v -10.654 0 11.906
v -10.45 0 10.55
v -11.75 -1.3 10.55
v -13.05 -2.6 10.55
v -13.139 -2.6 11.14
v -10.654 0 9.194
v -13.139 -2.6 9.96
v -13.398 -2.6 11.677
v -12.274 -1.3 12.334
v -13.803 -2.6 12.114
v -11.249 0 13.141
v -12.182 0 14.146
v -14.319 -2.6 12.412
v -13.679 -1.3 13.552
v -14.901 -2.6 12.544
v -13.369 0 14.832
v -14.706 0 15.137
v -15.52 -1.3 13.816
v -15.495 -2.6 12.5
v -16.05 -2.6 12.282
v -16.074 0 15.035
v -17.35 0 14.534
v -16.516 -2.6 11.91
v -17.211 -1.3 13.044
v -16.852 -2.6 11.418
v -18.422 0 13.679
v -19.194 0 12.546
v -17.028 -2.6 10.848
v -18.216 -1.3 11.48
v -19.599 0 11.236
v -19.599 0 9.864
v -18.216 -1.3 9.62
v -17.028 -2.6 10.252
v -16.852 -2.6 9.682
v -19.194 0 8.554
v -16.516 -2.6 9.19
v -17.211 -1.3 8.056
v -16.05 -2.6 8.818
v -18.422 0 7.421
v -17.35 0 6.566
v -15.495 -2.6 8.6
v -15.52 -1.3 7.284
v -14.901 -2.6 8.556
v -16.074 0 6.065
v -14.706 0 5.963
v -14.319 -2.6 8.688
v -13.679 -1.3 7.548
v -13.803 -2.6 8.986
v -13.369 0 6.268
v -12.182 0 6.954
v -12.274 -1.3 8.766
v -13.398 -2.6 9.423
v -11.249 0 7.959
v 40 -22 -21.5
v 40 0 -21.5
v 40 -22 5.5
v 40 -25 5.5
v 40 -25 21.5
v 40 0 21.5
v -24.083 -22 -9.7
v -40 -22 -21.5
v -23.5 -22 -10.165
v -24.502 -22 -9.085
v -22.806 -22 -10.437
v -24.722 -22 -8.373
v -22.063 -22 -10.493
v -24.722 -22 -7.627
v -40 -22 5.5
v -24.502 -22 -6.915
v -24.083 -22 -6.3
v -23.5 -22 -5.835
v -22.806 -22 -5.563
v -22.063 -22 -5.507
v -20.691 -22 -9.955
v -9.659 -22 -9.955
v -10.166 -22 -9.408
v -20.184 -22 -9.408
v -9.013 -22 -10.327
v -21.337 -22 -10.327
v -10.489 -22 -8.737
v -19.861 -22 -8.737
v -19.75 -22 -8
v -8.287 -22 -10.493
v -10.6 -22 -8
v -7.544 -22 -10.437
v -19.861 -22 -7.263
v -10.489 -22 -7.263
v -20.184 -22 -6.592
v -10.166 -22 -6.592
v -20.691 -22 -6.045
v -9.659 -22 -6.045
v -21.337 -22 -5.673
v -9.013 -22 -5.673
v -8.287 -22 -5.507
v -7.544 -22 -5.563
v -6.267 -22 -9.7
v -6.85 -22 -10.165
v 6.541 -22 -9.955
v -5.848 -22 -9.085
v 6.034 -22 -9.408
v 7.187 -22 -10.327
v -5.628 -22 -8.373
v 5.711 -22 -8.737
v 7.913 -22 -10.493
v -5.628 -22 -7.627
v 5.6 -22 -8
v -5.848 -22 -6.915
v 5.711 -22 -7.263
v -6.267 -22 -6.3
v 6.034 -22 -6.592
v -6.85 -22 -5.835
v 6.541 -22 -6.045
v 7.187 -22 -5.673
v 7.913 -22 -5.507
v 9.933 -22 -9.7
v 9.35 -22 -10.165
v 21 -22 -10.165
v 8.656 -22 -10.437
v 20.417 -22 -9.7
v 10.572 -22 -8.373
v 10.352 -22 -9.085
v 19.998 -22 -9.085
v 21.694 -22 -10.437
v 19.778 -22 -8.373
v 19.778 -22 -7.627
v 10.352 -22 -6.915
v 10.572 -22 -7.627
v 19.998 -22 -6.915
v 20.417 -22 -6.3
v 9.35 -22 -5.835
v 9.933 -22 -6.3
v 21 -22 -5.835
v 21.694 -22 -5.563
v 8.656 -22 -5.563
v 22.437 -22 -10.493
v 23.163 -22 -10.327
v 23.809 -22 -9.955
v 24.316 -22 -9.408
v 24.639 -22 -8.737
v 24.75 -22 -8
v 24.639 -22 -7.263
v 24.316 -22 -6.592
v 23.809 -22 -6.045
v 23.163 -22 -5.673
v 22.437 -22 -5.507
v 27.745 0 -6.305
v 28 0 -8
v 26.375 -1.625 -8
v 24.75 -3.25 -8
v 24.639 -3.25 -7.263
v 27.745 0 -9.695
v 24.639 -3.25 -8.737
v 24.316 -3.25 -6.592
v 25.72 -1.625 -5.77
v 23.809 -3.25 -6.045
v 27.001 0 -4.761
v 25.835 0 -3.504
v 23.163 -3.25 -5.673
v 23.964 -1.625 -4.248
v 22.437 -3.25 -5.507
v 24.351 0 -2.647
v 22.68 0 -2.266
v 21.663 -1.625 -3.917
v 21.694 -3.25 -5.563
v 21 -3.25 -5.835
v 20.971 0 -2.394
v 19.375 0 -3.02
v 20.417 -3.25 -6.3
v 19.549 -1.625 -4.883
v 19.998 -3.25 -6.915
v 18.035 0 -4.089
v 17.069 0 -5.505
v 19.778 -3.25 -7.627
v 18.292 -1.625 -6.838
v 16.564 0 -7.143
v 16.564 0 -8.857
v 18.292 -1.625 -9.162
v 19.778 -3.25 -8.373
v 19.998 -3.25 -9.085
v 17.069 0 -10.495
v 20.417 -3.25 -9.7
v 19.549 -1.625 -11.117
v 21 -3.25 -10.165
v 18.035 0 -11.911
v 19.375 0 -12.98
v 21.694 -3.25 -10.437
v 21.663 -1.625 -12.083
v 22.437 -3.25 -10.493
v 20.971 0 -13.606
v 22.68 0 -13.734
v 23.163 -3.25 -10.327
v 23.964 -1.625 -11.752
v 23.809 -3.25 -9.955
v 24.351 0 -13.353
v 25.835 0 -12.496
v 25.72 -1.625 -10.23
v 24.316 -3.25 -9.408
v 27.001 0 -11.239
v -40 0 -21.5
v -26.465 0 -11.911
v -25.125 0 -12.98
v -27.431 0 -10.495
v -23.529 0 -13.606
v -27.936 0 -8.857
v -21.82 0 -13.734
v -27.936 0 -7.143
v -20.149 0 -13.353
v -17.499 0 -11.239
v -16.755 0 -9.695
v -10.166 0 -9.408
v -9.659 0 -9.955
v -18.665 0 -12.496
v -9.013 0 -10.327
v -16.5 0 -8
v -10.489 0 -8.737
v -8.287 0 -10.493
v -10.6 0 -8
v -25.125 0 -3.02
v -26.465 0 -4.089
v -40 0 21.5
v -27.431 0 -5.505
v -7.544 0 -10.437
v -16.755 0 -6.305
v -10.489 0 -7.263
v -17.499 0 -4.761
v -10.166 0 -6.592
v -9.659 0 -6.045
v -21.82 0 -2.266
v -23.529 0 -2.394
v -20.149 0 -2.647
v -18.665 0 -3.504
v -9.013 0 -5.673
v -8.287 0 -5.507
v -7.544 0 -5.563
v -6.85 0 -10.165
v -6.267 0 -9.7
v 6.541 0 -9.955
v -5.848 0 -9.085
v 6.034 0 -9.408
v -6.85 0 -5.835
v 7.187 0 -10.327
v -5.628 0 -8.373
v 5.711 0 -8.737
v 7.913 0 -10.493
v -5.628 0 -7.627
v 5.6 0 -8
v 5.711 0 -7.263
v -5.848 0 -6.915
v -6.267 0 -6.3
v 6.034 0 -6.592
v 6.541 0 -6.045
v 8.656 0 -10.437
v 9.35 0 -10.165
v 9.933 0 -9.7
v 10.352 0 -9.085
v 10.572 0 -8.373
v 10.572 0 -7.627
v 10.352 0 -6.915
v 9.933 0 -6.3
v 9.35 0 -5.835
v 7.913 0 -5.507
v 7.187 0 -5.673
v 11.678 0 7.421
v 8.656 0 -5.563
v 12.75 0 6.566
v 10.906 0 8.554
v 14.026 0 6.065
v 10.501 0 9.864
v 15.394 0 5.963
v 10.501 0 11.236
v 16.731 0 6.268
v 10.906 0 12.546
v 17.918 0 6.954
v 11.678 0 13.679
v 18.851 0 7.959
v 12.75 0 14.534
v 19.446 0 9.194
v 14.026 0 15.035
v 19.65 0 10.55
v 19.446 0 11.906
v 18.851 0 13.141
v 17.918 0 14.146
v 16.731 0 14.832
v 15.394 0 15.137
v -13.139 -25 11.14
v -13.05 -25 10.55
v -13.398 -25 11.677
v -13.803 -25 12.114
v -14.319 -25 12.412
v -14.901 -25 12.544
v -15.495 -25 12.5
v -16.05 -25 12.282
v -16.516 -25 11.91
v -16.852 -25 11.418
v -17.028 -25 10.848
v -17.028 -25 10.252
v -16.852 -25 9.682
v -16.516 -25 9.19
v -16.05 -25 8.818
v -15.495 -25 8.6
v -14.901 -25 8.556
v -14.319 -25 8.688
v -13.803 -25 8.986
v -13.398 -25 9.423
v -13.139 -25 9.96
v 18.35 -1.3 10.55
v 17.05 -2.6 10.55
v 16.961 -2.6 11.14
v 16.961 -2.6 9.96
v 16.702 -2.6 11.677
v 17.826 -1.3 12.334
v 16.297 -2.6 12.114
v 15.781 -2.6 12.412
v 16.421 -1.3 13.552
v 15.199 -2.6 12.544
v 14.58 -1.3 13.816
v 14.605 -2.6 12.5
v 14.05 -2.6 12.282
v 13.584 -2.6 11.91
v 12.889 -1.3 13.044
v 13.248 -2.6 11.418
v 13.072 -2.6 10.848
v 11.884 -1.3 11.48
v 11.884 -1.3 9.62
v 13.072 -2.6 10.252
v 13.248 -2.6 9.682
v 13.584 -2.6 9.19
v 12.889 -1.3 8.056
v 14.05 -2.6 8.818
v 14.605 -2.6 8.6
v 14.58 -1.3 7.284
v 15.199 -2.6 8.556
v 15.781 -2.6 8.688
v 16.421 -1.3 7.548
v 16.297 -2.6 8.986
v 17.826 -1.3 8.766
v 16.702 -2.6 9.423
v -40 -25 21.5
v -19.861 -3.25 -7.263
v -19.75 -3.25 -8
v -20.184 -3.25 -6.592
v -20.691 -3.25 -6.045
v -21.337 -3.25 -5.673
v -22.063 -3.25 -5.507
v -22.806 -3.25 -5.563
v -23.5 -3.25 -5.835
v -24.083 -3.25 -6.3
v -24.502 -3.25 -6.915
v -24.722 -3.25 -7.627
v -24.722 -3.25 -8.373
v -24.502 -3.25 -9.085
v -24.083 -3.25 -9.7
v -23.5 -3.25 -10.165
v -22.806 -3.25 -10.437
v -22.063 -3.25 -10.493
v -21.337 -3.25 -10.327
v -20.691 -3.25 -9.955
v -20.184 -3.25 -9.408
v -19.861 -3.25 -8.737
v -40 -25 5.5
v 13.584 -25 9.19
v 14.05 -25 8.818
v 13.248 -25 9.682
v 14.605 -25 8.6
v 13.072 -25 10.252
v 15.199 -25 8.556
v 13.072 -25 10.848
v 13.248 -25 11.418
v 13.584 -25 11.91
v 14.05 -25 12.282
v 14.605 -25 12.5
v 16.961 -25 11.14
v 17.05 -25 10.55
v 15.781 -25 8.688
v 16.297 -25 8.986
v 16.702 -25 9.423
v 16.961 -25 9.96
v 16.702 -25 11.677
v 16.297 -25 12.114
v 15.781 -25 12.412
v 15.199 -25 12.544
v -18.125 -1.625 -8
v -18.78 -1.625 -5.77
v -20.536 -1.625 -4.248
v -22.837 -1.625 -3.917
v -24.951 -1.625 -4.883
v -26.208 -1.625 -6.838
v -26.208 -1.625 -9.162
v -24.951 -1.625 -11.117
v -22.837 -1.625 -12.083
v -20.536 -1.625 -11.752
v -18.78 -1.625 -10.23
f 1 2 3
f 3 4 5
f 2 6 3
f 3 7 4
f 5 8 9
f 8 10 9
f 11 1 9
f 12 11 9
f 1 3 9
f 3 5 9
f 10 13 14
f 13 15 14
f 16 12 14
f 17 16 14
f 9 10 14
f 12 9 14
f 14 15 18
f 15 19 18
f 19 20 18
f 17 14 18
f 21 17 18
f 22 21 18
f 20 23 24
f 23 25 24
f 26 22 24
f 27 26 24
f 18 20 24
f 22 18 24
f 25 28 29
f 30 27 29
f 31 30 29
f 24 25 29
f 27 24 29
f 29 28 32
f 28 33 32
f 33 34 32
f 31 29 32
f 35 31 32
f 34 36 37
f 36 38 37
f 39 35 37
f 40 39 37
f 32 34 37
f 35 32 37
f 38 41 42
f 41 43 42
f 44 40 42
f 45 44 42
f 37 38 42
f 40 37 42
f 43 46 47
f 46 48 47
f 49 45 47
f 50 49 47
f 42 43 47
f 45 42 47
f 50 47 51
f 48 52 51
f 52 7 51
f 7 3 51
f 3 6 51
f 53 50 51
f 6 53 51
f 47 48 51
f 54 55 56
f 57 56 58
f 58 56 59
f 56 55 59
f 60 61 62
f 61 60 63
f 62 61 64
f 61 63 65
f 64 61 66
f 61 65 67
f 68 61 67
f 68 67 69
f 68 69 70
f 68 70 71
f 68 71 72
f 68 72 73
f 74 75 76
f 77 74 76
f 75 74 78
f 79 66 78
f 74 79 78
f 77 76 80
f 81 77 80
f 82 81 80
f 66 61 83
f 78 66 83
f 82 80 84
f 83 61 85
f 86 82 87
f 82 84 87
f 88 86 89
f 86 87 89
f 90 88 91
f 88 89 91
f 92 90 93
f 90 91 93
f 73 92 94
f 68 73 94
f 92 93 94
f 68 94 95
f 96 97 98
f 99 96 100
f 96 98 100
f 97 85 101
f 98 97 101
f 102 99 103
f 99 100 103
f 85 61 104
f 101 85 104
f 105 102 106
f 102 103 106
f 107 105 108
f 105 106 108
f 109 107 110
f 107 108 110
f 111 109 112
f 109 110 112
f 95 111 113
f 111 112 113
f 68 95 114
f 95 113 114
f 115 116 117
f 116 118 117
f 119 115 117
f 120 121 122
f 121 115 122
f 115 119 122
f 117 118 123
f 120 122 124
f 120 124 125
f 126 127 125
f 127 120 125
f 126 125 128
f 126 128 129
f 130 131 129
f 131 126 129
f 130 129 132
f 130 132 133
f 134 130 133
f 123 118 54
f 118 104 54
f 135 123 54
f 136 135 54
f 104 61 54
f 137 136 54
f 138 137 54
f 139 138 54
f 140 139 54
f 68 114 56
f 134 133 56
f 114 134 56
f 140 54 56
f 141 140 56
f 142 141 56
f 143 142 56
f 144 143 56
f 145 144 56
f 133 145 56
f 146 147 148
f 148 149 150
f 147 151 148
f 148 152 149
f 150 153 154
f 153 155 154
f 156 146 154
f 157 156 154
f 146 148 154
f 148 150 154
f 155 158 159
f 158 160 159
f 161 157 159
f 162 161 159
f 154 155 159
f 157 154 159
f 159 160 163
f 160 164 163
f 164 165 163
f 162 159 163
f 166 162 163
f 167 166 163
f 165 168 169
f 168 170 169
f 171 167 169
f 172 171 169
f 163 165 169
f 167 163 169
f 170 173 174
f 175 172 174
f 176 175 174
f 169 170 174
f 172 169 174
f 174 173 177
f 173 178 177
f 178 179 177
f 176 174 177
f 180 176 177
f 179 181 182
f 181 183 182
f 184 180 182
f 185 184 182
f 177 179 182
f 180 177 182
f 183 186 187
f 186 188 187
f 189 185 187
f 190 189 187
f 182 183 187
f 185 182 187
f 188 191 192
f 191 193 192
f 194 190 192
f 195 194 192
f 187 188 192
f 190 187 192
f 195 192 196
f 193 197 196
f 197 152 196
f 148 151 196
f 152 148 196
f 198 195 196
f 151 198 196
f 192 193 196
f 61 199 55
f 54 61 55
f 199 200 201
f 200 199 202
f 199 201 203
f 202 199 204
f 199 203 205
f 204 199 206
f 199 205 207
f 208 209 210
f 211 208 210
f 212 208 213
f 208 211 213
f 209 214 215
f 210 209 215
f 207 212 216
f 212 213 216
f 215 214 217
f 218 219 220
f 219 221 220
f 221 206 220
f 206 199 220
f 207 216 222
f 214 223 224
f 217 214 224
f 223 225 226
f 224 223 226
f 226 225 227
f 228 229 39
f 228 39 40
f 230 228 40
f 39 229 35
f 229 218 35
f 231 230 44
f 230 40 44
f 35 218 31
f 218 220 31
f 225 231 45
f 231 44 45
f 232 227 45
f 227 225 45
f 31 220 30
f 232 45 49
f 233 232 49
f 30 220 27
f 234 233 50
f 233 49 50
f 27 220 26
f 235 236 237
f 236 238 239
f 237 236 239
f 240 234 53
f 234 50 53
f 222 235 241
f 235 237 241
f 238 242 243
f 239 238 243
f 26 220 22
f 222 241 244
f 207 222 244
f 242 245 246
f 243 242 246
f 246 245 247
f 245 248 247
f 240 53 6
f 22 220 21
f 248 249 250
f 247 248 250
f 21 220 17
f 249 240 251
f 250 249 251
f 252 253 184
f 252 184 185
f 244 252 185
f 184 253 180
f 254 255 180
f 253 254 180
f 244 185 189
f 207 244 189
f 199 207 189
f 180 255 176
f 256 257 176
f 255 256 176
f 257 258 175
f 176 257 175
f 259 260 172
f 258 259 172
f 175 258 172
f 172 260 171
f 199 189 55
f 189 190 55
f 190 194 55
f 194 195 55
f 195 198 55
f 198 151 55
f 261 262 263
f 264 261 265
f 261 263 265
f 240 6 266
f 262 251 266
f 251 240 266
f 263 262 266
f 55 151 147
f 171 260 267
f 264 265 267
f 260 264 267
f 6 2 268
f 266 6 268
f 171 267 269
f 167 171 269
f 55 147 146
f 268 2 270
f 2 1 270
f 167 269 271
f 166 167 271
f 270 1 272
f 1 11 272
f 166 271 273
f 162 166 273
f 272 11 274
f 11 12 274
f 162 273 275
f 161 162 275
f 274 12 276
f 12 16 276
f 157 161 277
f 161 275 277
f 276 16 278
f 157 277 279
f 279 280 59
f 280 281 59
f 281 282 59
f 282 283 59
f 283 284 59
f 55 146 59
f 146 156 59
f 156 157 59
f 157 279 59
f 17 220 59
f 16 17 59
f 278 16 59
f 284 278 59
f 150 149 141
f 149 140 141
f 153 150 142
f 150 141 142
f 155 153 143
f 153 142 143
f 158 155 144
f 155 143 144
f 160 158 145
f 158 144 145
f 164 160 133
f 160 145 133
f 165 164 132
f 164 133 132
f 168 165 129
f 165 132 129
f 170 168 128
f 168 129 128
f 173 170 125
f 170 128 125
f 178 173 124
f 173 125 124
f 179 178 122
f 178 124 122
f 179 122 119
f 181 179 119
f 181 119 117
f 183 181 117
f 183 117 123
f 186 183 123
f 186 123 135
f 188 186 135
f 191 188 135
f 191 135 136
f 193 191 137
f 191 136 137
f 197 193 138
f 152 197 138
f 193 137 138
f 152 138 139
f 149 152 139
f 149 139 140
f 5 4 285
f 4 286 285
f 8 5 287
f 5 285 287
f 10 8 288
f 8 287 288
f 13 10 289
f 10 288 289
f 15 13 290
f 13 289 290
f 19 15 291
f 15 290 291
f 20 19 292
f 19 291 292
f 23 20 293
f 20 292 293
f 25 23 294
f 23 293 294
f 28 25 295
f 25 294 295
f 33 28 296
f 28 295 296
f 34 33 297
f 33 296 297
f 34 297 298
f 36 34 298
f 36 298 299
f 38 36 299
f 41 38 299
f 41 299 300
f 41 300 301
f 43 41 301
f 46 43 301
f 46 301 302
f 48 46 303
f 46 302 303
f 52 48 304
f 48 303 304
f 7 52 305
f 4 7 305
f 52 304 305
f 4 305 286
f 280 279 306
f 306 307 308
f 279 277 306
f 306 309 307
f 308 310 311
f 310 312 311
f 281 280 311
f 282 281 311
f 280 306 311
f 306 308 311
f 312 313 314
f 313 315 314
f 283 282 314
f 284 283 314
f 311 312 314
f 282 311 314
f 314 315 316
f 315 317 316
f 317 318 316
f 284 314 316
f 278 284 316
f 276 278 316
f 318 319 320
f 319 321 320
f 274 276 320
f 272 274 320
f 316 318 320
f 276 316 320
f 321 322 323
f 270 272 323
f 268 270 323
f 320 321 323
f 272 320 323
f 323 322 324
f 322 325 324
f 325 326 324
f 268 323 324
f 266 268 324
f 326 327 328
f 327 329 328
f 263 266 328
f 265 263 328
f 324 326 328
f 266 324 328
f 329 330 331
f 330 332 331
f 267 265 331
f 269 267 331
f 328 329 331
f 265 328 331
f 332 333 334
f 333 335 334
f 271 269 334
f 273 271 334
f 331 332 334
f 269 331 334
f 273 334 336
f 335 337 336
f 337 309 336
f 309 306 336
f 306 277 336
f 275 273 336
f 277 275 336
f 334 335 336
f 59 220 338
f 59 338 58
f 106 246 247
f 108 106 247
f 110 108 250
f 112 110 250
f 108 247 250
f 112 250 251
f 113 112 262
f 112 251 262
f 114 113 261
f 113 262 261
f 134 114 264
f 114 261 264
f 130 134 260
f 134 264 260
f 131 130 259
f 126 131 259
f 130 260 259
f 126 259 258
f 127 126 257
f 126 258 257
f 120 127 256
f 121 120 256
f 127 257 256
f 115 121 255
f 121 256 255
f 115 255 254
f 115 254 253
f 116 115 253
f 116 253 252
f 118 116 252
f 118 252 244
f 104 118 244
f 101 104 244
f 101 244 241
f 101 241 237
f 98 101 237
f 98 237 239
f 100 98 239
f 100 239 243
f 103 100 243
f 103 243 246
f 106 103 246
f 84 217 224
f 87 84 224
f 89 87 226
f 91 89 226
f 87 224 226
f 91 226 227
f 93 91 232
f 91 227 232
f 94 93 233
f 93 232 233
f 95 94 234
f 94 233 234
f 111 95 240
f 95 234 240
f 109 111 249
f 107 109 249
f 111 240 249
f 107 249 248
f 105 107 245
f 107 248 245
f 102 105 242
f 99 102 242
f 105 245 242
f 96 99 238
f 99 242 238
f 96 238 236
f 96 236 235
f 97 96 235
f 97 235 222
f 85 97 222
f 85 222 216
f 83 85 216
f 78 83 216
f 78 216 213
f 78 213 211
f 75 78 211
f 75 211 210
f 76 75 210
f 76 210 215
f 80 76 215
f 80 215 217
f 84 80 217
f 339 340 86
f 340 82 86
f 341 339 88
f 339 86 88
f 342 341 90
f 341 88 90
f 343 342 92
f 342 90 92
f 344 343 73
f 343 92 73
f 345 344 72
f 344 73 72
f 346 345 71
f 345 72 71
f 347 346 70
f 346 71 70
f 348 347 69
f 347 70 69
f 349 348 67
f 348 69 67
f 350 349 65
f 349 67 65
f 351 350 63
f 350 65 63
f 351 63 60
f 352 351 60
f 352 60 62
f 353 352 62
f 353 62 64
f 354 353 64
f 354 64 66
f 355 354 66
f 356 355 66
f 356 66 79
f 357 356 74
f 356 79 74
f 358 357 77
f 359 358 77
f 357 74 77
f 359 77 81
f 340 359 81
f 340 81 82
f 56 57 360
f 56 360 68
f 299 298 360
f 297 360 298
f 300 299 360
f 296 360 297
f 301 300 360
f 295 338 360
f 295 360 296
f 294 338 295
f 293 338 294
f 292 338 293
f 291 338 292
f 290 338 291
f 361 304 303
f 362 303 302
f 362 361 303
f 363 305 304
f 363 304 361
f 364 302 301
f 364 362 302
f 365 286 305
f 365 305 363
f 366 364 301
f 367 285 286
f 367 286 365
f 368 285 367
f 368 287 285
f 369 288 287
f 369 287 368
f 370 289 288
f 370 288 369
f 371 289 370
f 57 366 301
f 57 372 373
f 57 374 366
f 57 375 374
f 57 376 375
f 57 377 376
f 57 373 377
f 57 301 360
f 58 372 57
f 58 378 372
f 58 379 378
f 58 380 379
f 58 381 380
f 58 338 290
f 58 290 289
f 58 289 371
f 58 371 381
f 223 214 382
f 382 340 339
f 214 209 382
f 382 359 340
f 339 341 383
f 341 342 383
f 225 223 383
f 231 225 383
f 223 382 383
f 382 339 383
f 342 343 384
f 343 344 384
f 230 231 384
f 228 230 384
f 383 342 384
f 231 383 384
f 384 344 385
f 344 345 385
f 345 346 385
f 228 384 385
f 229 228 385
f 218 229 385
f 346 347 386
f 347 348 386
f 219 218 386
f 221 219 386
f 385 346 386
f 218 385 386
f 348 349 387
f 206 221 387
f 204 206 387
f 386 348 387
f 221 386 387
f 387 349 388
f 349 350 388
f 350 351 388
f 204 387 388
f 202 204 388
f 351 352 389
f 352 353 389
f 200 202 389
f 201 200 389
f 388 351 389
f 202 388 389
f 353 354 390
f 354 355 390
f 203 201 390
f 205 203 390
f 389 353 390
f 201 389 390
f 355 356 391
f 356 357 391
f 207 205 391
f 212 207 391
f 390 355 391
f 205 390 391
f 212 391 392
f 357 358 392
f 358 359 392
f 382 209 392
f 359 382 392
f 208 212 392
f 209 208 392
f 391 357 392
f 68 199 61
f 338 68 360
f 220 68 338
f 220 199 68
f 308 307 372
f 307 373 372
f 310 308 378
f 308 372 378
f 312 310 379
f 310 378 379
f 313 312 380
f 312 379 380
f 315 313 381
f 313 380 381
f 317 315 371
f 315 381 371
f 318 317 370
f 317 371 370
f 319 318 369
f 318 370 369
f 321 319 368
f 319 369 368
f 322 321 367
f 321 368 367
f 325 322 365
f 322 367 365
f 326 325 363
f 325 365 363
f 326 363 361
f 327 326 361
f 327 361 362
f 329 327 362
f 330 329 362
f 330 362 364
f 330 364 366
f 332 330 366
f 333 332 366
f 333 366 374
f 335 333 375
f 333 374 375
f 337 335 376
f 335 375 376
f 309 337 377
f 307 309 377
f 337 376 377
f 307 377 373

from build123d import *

# Parameters (mm, degrees)
F0_W           = 80
F0_H           = 43
F1_DEPTH       = 25
F2_W           = 3
F2_H           = 27
F3_DEPTH       = 80.001
F4_R           = 2.5
F5_DEPTH       = 25.001
F6_D           = 4
F6_CSINK_D     = 9.2
F6_CSINK_ANGLE = 90
F7_D           = 5
F7_CSINK_D     = 11.5
F7_CSINK_ANGLE = 90


with BuildPart() as f1:
    # F0 (on Front) → F1 (new body)
    with BuildSketch(Plane.XZ):
        Rectangle(F0_W, F0_H)
    extrude(amount=F1_DEPTH)

    # F2 (on face) → F3 (cut, through all)
    with BuildSketch(Plane.YZ.offset(40)):
        with Locations((-23.5, -8)):
            Rectangle(F2_W, F2_H)
    extrude(amount=-F3_DEPTH, mode=Mode.SUBTRACT)

    # F4 (on face) → F5 (cut, through all)
    with BuildSketch(Plane(origin=(0, 0, 0), x_dir=(-1, 0, 0), z_dir=(0, 1, 0))):
        with Locations((-8.1, -8)):
            Circle(F4_R)
        with Locations((8.1, -8)):
            Circle(F4_R)
    extrude(amount=-F5_DEPTH, mode=Mode.SUBTRACT)

    # F6 (through all)
    with Locations(Plane(origin=(0, 0, 0), x_dir=(-1, 0, 0), z_dir=(0, 1, 0))):
        with Locations((-15.05, 10.55), (15.05, 10.55)):
            CounterSinkHole(F6_D / 2, F6_CSINK_D / 2, counter_sink_angle=F6_CSINK_ANGLE)

    # F7 (through all)
    with Locations(Plane(origin=(0, 0, 0), x_dir=(-1, 0, 0), z_dir=(0, 1, 0))):
        with Locations((-22.25, -8), (22.25, -8)):
            CounterSinkHole(F7_D / 2, F7_CSINK_D / 2, counter_sink_angle=F7_CSINK_ANGLE)


solid = f1.part
